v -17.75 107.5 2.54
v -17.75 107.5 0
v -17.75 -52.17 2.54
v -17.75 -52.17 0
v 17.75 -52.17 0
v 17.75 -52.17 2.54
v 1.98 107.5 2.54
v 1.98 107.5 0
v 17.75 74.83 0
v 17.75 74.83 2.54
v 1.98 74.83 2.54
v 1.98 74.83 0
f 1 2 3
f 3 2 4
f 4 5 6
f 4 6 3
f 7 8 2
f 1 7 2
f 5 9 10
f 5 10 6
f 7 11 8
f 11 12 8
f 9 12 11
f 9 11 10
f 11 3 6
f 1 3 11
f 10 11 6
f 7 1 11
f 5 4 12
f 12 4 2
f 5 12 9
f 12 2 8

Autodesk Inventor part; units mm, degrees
ref_plane "YZ Plane" through (0, 0, 0) normal (1, 0, 0) x (0, 1, 0)
ref_plane "XZ Plane" through (0, 0, 0) normal (0, 1, 0) x (-1, 0, 0)
ref_plane "XY Plane" through (0, 0, 0) normal (0, 0, 1) x (1, 0, 0)
ref_plane "Work Plane1" through (0, 0, 0) normal (0, 0, 1) x (1, 0, 0)
sketch "Sketch1" plane through (0, 0, 0) normal (0, 0, 1) x (1, 0, 0)
  line L0 (8.0002, 76.1) -> (3.2502, 76.1) construction
  line L1 (3.2502, 90.8) -> (3.2502, 103.5) construction
  line L2 (-17.75, 107.5) -> (-17.75, -107.5) construction
  line L3 (17.75, 107.5) -> (-17.75, 107.5) construction
  line L4 (1.9802, 107.5) -> (-17.75, 107.5)
  line L5 (-17.75, 107.5) -> (-17.75, 74.83)
  line L6 (-17.75, 74.83) -> (1.9802, 74.83)
  line L7 (1.9802, 74.83) -> (1.9802, 107.5)
  line L8 (-17.75, 74.83) -> (17.75, 74.83)
  line L9 (17.75, 74.83) -> (17.75, -52.17)
  line L10 (17.75, -52.17) -> (-17.75, -52.17)
  line L11 (-17.75, -52.17) -> (-17.75, 74.83)
  point P0 (0, 0)
  dimension "d1" = 1.27
  dimension "d2" = 1.27
  dimension "d5" = 127
extrude "Extrusion1" add sketch "Sketch1" along normal blind 2.54
sketch "Sketch2" plane through (0, 0, 2.54) normal (0, 0, 1) x (1, 0, 0)
  circle A0 centre (9.0001, 13.4819) radius 34.925 construction
  line L0 (12.3751, 101.9) -> (12.3751, 92.4) construction
  line L1 (5.6252, 92.4) -> (5.6252, 101.9) construction
  line L2 (-23.5916, 26.0332) -> (5.6252, 101.9) construction
  line L3 (41.5918, 26.0331) -> (12.3751, 101.9) construction
  point P0 (0, 0)
sketch "Sketch3" plane through (0, 0, 2.54) normal (0, 0, 1) x (1, 0, 0)
  circle A0 centre (9.0001, 13.4819) radius 44.45 construction
  point P0 (0, 0)
properties part number "horizontal spool mount bottom"
